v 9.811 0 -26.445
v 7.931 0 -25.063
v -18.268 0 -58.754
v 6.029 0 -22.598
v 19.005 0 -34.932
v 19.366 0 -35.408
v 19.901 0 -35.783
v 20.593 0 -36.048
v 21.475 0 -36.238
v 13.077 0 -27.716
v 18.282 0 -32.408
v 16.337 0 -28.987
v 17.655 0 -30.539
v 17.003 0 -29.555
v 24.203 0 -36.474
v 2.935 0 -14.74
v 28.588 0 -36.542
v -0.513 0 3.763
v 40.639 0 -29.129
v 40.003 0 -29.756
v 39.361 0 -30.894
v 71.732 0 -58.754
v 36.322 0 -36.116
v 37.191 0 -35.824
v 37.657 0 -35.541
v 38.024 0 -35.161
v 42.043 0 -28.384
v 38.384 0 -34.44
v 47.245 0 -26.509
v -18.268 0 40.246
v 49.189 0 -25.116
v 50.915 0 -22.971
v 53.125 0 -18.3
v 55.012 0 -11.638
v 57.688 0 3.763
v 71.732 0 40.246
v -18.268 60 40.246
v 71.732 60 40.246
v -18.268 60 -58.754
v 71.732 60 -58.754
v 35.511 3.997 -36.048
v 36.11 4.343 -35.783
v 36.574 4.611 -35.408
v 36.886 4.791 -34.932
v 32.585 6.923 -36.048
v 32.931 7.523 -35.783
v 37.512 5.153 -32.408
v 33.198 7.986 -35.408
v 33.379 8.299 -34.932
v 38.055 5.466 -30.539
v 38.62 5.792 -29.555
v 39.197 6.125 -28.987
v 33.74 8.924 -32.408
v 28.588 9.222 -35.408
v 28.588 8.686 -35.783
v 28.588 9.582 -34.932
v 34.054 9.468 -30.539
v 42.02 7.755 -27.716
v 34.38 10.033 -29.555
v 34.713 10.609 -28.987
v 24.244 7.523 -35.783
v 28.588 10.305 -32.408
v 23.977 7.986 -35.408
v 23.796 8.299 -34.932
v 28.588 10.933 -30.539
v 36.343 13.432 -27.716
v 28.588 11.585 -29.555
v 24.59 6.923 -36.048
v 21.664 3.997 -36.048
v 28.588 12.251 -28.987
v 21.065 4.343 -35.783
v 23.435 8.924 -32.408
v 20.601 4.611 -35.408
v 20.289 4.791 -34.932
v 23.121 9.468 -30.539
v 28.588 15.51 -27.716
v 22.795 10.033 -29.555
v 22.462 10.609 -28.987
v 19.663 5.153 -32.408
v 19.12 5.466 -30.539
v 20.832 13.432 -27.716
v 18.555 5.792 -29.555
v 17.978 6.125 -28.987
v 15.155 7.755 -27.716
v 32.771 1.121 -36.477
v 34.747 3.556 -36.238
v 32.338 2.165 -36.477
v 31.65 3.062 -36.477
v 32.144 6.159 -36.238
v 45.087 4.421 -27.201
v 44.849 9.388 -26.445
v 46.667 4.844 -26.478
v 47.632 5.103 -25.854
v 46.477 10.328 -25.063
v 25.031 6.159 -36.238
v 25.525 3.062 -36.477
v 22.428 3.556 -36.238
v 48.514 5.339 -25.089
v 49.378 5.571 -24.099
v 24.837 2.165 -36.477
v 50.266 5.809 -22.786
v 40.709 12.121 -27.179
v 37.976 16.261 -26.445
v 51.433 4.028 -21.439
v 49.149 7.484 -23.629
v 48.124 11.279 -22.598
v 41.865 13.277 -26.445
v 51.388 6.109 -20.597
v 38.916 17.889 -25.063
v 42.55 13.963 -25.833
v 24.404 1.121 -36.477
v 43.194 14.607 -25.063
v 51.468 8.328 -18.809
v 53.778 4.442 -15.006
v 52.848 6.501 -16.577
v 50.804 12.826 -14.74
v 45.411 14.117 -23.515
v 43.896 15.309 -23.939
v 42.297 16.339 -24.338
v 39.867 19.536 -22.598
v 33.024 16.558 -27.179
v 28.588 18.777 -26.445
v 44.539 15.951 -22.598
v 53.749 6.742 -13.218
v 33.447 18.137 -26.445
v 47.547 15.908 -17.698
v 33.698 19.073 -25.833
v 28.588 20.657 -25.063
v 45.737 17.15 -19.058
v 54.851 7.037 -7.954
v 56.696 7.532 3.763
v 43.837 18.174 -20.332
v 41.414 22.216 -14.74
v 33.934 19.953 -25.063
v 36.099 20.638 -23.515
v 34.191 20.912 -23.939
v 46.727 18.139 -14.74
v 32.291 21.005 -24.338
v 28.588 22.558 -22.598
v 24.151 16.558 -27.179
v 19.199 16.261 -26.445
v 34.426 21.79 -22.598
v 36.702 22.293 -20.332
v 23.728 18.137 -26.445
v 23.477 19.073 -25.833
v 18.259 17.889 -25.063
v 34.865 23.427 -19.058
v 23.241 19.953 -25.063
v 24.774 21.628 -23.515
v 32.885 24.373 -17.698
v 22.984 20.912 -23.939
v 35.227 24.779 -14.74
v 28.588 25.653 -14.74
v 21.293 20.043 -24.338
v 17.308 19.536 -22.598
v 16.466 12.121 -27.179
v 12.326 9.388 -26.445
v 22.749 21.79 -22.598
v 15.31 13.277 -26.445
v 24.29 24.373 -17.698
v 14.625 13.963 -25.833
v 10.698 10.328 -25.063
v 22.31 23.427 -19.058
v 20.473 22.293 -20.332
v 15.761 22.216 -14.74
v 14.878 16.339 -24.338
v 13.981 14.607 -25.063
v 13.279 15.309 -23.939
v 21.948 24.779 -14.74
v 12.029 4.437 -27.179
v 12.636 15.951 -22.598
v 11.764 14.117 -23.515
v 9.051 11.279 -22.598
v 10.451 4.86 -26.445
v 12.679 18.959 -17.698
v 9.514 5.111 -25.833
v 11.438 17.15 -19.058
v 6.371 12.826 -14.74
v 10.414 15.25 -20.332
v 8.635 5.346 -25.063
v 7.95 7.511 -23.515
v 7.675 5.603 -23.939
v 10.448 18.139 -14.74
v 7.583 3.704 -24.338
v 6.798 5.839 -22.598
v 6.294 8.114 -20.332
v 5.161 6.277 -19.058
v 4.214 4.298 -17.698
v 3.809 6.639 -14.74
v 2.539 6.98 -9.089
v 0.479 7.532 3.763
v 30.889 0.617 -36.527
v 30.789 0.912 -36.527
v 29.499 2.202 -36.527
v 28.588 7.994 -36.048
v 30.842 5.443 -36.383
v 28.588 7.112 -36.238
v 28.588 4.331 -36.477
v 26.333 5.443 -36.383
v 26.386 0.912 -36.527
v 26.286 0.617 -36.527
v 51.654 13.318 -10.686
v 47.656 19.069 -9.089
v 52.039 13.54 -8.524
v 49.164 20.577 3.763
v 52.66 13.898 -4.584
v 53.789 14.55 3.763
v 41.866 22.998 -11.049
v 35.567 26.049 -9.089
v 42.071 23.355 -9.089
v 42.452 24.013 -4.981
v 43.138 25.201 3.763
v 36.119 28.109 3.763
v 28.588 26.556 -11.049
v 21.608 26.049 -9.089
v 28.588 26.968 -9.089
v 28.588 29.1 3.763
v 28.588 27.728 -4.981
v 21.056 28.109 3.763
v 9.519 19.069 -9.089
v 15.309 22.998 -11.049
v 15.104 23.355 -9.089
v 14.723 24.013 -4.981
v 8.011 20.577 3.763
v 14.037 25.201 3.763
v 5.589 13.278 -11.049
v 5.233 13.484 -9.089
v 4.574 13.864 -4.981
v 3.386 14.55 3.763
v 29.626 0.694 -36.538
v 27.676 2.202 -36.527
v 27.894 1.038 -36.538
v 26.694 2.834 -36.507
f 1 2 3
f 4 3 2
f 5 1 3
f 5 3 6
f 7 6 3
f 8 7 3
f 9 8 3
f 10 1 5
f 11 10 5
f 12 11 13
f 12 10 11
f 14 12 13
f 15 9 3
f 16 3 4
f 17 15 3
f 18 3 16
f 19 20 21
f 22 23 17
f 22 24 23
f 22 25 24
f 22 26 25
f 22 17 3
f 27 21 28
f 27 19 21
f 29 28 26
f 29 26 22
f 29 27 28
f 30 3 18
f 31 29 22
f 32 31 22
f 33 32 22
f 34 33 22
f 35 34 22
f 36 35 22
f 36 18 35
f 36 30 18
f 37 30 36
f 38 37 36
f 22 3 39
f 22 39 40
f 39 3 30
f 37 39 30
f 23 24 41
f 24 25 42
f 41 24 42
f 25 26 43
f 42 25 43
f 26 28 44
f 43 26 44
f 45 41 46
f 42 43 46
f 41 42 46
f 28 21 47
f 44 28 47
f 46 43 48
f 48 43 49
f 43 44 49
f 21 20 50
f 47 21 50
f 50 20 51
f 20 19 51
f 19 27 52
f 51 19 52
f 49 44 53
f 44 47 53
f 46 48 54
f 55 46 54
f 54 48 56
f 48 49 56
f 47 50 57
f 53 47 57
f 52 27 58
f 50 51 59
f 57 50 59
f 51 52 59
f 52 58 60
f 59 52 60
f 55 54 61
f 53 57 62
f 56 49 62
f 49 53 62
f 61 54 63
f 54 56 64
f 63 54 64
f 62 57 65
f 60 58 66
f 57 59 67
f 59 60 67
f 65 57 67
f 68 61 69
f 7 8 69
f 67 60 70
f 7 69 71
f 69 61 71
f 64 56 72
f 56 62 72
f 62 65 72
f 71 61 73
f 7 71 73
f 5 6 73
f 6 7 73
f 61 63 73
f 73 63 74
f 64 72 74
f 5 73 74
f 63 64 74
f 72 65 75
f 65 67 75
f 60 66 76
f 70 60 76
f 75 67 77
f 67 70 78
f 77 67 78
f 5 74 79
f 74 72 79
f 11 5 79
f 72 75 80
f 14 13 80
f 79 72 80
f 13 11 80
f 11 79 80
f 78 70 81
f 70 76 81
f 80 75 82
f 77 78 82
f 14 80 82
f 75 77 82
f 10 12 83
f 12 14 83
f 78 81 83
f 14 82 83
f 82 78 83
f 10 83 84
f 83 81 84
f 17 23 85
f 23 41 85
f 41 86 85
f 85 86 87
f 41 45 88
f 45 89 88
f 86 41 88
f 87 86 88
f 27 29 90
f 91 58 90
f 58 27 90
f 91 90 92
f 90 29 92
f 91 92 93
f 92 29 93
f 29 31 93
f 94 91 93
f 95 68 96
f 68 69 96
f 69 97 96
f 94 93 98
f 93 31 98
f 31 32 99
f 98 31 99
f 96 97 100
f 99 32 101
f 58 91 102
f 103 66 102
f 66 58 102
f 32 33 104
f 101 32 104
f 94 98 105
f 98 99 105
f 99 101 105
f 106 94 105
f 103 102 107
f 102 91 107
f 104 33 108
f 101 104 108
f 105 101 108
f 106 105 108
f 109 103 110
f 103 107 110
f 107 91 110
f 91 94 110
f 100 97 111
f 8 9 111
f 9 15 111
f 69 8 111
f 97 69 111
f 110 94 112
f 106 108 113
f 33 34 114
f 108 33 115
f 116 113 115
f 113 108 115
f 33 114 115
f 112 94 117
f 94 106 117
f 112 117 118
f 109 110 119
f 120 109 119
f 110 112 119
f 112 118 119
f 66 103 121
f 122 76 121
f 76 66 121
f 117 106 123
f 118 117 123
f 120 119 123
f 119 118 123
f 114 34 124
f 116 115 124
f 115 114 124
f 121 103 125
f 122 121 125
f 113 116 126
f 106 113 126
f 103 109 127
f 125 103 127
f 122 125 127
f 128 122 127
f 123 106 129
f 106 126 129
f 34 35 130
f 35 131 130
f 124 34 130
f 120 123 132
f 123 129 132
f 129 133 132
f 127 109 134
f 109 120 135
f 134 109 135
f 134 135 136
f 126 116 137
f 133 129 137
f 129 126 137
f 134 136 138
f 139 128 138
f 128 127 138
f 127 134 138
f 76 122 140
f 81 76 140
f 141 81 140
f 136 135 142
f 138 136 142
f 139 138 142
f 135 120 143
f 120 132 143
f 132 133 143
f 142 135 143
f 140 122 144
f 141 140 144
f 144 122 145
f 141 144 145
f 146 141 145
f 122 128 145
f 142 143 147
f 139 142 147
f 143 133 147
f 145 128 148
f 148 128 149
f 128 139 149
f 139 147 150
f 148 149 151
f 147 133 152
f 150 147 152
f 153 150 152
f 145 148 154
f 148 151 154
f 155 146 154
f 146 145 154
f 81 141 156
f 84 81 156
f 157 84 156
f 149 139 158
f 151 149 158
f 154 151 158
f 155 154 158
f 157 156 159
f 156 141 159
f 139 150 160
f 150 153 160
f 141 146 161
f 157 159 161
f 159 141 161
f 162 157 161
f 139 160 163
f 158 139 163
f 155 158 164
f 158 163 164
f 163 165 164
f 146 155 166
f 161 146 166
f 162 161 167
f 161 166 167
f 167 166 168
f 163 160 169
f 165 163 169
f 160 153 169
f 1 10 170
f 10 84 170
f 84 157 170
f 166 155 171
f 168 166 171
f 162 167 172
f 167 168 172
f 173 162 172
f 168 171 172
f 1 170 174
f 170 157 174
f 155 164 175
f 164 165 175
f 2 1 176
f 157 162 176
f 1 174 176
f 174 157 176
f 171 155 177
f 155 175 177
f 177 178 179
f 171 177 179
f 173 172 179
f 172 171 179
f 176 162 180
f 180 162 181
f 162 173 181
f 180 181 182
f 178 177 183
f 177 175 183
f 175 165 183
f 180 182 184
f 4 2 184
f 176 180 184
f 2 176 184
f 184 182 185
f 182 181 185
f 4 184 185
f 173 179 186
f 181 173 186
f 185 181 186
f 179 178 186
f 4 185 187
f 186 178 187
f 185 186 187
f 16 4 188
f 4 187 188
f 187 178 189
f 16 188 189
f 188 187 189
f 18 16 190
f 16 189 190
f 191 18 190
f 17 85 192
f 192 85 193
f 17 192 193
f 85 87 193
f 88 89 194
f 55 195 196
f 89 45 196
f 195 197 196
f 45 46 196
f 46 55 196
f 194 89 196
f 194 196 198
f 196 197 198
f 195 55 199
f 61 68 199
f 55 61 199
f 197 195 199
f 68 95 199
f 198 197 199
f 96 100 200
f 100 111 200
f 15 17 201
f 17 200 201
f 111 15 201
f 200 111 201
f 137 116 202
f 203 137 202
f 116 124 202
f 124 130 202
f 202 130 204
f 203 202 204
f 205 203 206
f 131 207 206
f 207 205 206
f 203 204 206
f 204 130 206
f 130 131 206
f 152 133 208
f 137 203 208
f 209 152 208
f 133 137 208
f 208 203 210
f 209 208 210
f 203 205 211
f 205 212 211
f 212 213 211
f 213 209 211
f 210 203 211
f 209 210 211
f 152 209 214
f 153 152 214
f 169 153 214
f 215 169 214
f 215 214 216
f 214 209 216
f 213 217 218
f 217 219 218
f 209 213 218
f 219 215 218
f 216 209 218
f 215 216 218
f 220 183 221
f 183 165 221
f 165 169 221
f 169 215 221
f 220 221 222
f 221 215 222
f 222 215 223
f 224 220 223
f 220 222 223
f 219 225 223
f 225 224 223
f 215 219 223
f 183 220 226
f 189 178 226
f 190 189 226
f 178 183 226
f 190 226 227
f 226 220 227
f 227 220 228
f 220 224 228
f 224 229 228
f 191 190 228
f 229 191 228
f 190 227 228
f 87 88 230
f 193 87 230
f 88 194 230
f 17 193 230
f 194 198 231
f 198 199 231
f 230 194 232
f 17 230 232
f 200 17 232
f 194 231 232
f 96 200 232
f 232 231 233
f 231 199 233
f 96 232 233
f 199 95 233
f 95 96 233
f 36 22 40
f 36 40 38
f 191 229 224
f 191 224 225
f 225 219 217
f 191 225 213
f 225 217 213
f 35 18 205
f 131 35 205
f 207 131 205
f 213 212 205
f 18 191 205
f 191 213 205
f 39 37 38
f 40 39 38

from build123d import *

# Parameters (mm, degrees)
F2_W     = 90
F2_H     = 99
F3_DEPTH = 60


with BuildPart() as f1:
    # F0 (on Front) → F1 (revolve)
    with BuildSketch(Plane.XZ):
        with BuildLine():
            Line((28.5875385463, 3.7629891087), (28.5875385463, -36.5419039394))
            add(Edge.make_bspline(
                [(28.5875385463, -36.5419039394), (36.877758444, -36.5419039394), (38.6275867194, -35.8378488567), (39.3034274749, -27.6489692273), (52.7312499665, -28.0489931449), (55.7562974133, -9.2624192261), (57.687700038, 3.7629891087)],
                knots=[0, 0, 0, 0, 0.2273966772, 0.3897712394, 0.6048240119, 1, 1, 1, 1], degree=3))
            Line((57.687700038, 3.7629891087), (28.5875385463, 3.7629891087))
        make_face()
    revolve(axis=Axis((28.5875385463, 0, -16.3894574153), (0, 0, 1)))


with BuildPart() as f3:
    # F2 (on Front) → F3 (new body)
    with BuildSketch(Plane.XZ):
        with Locations((26.7319735885, -9.2539225817)):
            Rectangle(F2_W, F2_H)
    extrude(amount=-F3_DEPTH)

    # F4: cut F1
    add(f1.part, mode=Mode.SUBTRACT)


solid = f3.part
